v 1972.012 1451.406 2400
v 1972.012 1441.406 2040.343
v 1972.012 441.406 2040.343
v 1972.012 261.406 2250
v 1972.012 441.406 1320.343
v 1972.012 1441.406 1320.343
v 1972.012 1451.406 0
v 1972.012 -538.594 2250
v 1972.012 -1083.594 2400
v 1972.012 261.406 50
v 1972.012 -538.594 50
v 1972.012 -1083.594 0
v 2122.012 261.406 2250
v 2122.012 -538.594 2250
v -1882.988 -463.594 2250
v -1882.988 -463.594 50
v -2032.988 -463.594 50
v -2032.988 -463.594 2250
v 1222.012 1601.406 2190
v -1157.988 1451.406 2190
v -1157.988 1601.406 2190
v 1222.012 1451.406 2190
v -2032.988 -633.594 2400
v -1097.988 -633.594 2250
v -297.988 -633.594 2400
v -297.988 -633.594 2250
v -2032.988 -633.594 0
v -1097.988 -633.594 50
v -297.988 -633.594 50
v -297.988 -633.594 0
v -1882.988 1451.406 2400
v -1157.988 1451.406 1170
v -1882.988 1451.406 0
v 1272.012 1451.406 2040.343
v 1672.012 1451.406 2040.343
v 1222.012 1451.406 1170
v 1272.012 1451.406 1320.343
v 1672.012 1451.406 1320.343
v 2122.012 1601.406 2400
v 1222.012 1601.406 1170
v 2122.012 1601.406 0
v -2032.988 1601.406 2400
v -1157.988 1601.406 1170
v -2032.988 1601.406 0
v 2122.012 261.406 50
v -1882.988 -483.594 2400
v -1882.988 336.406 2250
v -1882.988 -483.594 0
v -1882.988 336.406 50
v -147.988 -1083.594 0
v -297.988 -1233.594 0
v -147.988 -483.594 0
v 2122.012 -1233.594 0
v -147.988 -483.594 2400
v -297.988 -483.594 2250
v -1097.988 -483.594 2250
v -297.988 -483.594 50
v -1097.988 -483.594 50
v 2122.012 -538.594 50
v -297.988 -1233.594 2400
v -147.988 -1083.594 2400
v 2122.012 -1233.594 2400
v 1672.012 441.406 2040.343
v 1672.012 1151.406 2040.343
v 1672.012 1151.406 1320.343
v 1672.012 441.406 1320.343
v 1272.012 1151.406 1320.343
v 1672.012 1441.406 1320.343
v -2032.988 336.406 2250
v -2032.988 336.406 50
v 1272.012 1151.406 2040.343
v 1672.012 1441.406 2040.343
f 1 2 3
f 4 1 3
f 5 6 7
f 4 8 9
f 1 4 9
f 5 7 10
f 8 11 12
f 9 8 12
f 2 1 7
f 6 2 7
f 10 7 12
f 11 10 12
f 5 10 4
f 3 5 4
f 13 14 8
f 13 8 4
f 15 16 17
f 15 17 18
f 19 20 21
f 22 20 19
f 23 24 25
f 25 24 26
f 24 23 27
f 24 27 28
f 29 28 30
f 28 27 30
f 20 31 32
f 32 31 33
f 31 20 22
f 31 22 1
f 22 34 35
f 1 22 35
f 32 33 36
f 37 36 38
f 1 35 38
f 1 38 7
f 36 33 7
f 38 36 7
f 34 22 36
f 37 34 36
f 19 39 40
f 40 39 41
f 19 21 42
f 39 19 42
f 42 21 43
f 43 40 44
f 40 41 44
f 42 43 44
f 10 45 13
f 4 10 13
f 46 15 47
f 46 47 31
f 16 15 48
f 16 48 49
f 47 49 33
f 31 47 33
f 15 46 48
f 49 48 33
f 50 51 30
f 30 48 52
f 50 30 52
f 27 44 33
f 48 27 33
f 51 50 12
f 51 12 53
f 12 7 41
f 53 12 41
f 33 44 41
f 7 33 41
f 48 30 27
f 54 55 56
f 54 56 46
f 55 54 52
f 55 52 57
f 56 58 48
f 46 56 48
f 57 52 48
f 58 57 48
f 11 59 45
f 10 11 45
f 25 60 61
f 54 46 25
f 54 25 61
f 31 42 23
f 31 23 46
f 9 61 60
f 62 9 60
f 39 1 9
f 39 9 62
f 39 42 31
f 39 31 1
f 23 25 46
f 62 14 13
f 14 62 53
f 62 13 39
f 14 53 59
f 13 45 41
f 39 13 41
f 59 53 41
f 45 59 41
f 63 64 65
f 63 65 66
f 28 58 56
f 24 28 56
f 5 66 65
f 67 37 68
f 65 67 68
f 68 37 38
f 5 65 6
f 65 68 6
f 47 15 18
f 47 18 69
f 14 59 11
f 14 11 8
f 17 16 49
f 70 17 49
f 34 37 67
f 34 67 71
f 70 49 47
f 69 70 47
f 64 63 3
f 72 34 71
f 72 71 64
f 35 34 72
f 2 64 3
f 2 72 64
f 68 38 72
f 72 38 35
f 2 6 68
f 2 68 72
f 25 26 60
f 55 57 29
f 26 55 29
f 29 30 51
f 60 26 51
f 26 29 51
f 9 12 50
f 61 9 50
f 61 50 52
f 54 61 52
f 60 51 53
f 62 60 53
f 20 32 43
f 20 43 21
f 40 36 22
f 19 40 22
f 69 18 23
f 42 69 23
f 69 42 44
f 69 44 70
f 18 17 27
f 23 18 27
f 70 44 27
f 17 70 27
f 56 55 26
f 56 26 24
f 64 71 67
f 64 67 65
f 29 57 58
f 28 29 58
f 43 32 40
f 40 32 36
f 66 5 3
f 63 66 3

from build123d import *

# Parameters (mm, degrees)
F1_DEPTH  = 2400
F2_W      = 800
F2_H      = 2200
F3_DEPTH  = 150
F4_W      = 800
F4_H      = 2200
F5_DEPTH  = 150
F6_W      = 800
F6_H      = 2200
F7_DEPTH  = 150
F8_W      = 2380
F8_H      = 1020
F9_DEPTH  = 150
F11_W     = 600
F11_H     = 720
F11_W_2   = 400
F12_DEPTH = 300
F13_W     = 400
F13_H     = 720
F14_DEPTH = 300


with BuildPart() as f1:
    # F0 (on Top) → F1 (new body)
    with BuildSketch(Plane.XY):
        Polygon((2122.012167, -278.594359), (2122.012167, 1601.405657), (-2032.987833, 1601.405657), (-2032.987833, -633.594343), (-297.987833, -633.594343), (-297.987833, -1233.594343), (2122.012167, -1233.594343), align=None)
        Polygon((1972.012167, -1083.594343), (-147.987833, -1083.594343), (-147.987833, -483.594343), (-1882.987833, -483.594343), (-1882.987833, 1451.405657), (1972.012167, 1451.405657), (1972.012167, -538.594343), align=None, mode=Mode.SUBTRACT)
    extrude(amount=F1_DEPTH)

    # F2 (on face) → F3 (cut, through all)
    with BuildSketch(Plane.YZ.offset(2122.012167)):
        with Locations((-138.594343, 1150)):
            Rectangle(F2_W, F2_H)
    extrude(amount=-F3_DEPTH, mode=Mode.SUBTRACT)

    # F4 (on face) → F5 (cut, through all)
    with BuildSketch(Plane(origin=(0, -483.594343, 0), x_dir=(-1, 0, 0), z_dir=(0, 1, 0))):
        with Locations((697.987833, 1150)):
            Rectangle(F4_W, F4_H)
    extrude(amount=-F5_DEPTH, mode=Mode.SUBTRACT)

    # F6 (on face) → F7 (cut, through all)
    with BuildSketch(Plane.YZ.offset(-1882.987833)):
        with Locations((-63.594343, 1150)):
            Rectangle(F6_W, F6_H)
    extrude(amount=-F7_DEPTH, mode=Mode.SUBTRACT)

    # F8 (on face) → F9 (cut, through all)
    with BuildSketch(Plane.XZ.offset(-1451.405657)):
        with Locations((32.012167, 1680)):
            Rectangle(F8_W, F8_H)
    extrude(amount=-F9_DEPTH, mode=Mode.SUBTRACT)

    # F11 (on face) → F12 (join)
    with BuildSketch(Plane(origin=(1972.012167, 0, 0), x_dir=(0, -1, 0), z_dir=(-1, 0, 0))):
        with Locations((-1141.405657, 1680.342853)):
            Rectangle(F11_W, F11_H)
        with Locations((-641.405657, 1680.342853)):
            Rectangle(F11_W_2, F11_H)
    extrude(amount=F12_DEPTH)

    # F13 (on face) → F14 (join)
    with BuildSketch(Plane.XZ.offset(-1451.405657)):
        with Locations((1472.012167, 1680.342853)):
            Rectangle(F13_W, F13_H)
    extrude(amount=F14_DEPTH)


solid = f1.part
